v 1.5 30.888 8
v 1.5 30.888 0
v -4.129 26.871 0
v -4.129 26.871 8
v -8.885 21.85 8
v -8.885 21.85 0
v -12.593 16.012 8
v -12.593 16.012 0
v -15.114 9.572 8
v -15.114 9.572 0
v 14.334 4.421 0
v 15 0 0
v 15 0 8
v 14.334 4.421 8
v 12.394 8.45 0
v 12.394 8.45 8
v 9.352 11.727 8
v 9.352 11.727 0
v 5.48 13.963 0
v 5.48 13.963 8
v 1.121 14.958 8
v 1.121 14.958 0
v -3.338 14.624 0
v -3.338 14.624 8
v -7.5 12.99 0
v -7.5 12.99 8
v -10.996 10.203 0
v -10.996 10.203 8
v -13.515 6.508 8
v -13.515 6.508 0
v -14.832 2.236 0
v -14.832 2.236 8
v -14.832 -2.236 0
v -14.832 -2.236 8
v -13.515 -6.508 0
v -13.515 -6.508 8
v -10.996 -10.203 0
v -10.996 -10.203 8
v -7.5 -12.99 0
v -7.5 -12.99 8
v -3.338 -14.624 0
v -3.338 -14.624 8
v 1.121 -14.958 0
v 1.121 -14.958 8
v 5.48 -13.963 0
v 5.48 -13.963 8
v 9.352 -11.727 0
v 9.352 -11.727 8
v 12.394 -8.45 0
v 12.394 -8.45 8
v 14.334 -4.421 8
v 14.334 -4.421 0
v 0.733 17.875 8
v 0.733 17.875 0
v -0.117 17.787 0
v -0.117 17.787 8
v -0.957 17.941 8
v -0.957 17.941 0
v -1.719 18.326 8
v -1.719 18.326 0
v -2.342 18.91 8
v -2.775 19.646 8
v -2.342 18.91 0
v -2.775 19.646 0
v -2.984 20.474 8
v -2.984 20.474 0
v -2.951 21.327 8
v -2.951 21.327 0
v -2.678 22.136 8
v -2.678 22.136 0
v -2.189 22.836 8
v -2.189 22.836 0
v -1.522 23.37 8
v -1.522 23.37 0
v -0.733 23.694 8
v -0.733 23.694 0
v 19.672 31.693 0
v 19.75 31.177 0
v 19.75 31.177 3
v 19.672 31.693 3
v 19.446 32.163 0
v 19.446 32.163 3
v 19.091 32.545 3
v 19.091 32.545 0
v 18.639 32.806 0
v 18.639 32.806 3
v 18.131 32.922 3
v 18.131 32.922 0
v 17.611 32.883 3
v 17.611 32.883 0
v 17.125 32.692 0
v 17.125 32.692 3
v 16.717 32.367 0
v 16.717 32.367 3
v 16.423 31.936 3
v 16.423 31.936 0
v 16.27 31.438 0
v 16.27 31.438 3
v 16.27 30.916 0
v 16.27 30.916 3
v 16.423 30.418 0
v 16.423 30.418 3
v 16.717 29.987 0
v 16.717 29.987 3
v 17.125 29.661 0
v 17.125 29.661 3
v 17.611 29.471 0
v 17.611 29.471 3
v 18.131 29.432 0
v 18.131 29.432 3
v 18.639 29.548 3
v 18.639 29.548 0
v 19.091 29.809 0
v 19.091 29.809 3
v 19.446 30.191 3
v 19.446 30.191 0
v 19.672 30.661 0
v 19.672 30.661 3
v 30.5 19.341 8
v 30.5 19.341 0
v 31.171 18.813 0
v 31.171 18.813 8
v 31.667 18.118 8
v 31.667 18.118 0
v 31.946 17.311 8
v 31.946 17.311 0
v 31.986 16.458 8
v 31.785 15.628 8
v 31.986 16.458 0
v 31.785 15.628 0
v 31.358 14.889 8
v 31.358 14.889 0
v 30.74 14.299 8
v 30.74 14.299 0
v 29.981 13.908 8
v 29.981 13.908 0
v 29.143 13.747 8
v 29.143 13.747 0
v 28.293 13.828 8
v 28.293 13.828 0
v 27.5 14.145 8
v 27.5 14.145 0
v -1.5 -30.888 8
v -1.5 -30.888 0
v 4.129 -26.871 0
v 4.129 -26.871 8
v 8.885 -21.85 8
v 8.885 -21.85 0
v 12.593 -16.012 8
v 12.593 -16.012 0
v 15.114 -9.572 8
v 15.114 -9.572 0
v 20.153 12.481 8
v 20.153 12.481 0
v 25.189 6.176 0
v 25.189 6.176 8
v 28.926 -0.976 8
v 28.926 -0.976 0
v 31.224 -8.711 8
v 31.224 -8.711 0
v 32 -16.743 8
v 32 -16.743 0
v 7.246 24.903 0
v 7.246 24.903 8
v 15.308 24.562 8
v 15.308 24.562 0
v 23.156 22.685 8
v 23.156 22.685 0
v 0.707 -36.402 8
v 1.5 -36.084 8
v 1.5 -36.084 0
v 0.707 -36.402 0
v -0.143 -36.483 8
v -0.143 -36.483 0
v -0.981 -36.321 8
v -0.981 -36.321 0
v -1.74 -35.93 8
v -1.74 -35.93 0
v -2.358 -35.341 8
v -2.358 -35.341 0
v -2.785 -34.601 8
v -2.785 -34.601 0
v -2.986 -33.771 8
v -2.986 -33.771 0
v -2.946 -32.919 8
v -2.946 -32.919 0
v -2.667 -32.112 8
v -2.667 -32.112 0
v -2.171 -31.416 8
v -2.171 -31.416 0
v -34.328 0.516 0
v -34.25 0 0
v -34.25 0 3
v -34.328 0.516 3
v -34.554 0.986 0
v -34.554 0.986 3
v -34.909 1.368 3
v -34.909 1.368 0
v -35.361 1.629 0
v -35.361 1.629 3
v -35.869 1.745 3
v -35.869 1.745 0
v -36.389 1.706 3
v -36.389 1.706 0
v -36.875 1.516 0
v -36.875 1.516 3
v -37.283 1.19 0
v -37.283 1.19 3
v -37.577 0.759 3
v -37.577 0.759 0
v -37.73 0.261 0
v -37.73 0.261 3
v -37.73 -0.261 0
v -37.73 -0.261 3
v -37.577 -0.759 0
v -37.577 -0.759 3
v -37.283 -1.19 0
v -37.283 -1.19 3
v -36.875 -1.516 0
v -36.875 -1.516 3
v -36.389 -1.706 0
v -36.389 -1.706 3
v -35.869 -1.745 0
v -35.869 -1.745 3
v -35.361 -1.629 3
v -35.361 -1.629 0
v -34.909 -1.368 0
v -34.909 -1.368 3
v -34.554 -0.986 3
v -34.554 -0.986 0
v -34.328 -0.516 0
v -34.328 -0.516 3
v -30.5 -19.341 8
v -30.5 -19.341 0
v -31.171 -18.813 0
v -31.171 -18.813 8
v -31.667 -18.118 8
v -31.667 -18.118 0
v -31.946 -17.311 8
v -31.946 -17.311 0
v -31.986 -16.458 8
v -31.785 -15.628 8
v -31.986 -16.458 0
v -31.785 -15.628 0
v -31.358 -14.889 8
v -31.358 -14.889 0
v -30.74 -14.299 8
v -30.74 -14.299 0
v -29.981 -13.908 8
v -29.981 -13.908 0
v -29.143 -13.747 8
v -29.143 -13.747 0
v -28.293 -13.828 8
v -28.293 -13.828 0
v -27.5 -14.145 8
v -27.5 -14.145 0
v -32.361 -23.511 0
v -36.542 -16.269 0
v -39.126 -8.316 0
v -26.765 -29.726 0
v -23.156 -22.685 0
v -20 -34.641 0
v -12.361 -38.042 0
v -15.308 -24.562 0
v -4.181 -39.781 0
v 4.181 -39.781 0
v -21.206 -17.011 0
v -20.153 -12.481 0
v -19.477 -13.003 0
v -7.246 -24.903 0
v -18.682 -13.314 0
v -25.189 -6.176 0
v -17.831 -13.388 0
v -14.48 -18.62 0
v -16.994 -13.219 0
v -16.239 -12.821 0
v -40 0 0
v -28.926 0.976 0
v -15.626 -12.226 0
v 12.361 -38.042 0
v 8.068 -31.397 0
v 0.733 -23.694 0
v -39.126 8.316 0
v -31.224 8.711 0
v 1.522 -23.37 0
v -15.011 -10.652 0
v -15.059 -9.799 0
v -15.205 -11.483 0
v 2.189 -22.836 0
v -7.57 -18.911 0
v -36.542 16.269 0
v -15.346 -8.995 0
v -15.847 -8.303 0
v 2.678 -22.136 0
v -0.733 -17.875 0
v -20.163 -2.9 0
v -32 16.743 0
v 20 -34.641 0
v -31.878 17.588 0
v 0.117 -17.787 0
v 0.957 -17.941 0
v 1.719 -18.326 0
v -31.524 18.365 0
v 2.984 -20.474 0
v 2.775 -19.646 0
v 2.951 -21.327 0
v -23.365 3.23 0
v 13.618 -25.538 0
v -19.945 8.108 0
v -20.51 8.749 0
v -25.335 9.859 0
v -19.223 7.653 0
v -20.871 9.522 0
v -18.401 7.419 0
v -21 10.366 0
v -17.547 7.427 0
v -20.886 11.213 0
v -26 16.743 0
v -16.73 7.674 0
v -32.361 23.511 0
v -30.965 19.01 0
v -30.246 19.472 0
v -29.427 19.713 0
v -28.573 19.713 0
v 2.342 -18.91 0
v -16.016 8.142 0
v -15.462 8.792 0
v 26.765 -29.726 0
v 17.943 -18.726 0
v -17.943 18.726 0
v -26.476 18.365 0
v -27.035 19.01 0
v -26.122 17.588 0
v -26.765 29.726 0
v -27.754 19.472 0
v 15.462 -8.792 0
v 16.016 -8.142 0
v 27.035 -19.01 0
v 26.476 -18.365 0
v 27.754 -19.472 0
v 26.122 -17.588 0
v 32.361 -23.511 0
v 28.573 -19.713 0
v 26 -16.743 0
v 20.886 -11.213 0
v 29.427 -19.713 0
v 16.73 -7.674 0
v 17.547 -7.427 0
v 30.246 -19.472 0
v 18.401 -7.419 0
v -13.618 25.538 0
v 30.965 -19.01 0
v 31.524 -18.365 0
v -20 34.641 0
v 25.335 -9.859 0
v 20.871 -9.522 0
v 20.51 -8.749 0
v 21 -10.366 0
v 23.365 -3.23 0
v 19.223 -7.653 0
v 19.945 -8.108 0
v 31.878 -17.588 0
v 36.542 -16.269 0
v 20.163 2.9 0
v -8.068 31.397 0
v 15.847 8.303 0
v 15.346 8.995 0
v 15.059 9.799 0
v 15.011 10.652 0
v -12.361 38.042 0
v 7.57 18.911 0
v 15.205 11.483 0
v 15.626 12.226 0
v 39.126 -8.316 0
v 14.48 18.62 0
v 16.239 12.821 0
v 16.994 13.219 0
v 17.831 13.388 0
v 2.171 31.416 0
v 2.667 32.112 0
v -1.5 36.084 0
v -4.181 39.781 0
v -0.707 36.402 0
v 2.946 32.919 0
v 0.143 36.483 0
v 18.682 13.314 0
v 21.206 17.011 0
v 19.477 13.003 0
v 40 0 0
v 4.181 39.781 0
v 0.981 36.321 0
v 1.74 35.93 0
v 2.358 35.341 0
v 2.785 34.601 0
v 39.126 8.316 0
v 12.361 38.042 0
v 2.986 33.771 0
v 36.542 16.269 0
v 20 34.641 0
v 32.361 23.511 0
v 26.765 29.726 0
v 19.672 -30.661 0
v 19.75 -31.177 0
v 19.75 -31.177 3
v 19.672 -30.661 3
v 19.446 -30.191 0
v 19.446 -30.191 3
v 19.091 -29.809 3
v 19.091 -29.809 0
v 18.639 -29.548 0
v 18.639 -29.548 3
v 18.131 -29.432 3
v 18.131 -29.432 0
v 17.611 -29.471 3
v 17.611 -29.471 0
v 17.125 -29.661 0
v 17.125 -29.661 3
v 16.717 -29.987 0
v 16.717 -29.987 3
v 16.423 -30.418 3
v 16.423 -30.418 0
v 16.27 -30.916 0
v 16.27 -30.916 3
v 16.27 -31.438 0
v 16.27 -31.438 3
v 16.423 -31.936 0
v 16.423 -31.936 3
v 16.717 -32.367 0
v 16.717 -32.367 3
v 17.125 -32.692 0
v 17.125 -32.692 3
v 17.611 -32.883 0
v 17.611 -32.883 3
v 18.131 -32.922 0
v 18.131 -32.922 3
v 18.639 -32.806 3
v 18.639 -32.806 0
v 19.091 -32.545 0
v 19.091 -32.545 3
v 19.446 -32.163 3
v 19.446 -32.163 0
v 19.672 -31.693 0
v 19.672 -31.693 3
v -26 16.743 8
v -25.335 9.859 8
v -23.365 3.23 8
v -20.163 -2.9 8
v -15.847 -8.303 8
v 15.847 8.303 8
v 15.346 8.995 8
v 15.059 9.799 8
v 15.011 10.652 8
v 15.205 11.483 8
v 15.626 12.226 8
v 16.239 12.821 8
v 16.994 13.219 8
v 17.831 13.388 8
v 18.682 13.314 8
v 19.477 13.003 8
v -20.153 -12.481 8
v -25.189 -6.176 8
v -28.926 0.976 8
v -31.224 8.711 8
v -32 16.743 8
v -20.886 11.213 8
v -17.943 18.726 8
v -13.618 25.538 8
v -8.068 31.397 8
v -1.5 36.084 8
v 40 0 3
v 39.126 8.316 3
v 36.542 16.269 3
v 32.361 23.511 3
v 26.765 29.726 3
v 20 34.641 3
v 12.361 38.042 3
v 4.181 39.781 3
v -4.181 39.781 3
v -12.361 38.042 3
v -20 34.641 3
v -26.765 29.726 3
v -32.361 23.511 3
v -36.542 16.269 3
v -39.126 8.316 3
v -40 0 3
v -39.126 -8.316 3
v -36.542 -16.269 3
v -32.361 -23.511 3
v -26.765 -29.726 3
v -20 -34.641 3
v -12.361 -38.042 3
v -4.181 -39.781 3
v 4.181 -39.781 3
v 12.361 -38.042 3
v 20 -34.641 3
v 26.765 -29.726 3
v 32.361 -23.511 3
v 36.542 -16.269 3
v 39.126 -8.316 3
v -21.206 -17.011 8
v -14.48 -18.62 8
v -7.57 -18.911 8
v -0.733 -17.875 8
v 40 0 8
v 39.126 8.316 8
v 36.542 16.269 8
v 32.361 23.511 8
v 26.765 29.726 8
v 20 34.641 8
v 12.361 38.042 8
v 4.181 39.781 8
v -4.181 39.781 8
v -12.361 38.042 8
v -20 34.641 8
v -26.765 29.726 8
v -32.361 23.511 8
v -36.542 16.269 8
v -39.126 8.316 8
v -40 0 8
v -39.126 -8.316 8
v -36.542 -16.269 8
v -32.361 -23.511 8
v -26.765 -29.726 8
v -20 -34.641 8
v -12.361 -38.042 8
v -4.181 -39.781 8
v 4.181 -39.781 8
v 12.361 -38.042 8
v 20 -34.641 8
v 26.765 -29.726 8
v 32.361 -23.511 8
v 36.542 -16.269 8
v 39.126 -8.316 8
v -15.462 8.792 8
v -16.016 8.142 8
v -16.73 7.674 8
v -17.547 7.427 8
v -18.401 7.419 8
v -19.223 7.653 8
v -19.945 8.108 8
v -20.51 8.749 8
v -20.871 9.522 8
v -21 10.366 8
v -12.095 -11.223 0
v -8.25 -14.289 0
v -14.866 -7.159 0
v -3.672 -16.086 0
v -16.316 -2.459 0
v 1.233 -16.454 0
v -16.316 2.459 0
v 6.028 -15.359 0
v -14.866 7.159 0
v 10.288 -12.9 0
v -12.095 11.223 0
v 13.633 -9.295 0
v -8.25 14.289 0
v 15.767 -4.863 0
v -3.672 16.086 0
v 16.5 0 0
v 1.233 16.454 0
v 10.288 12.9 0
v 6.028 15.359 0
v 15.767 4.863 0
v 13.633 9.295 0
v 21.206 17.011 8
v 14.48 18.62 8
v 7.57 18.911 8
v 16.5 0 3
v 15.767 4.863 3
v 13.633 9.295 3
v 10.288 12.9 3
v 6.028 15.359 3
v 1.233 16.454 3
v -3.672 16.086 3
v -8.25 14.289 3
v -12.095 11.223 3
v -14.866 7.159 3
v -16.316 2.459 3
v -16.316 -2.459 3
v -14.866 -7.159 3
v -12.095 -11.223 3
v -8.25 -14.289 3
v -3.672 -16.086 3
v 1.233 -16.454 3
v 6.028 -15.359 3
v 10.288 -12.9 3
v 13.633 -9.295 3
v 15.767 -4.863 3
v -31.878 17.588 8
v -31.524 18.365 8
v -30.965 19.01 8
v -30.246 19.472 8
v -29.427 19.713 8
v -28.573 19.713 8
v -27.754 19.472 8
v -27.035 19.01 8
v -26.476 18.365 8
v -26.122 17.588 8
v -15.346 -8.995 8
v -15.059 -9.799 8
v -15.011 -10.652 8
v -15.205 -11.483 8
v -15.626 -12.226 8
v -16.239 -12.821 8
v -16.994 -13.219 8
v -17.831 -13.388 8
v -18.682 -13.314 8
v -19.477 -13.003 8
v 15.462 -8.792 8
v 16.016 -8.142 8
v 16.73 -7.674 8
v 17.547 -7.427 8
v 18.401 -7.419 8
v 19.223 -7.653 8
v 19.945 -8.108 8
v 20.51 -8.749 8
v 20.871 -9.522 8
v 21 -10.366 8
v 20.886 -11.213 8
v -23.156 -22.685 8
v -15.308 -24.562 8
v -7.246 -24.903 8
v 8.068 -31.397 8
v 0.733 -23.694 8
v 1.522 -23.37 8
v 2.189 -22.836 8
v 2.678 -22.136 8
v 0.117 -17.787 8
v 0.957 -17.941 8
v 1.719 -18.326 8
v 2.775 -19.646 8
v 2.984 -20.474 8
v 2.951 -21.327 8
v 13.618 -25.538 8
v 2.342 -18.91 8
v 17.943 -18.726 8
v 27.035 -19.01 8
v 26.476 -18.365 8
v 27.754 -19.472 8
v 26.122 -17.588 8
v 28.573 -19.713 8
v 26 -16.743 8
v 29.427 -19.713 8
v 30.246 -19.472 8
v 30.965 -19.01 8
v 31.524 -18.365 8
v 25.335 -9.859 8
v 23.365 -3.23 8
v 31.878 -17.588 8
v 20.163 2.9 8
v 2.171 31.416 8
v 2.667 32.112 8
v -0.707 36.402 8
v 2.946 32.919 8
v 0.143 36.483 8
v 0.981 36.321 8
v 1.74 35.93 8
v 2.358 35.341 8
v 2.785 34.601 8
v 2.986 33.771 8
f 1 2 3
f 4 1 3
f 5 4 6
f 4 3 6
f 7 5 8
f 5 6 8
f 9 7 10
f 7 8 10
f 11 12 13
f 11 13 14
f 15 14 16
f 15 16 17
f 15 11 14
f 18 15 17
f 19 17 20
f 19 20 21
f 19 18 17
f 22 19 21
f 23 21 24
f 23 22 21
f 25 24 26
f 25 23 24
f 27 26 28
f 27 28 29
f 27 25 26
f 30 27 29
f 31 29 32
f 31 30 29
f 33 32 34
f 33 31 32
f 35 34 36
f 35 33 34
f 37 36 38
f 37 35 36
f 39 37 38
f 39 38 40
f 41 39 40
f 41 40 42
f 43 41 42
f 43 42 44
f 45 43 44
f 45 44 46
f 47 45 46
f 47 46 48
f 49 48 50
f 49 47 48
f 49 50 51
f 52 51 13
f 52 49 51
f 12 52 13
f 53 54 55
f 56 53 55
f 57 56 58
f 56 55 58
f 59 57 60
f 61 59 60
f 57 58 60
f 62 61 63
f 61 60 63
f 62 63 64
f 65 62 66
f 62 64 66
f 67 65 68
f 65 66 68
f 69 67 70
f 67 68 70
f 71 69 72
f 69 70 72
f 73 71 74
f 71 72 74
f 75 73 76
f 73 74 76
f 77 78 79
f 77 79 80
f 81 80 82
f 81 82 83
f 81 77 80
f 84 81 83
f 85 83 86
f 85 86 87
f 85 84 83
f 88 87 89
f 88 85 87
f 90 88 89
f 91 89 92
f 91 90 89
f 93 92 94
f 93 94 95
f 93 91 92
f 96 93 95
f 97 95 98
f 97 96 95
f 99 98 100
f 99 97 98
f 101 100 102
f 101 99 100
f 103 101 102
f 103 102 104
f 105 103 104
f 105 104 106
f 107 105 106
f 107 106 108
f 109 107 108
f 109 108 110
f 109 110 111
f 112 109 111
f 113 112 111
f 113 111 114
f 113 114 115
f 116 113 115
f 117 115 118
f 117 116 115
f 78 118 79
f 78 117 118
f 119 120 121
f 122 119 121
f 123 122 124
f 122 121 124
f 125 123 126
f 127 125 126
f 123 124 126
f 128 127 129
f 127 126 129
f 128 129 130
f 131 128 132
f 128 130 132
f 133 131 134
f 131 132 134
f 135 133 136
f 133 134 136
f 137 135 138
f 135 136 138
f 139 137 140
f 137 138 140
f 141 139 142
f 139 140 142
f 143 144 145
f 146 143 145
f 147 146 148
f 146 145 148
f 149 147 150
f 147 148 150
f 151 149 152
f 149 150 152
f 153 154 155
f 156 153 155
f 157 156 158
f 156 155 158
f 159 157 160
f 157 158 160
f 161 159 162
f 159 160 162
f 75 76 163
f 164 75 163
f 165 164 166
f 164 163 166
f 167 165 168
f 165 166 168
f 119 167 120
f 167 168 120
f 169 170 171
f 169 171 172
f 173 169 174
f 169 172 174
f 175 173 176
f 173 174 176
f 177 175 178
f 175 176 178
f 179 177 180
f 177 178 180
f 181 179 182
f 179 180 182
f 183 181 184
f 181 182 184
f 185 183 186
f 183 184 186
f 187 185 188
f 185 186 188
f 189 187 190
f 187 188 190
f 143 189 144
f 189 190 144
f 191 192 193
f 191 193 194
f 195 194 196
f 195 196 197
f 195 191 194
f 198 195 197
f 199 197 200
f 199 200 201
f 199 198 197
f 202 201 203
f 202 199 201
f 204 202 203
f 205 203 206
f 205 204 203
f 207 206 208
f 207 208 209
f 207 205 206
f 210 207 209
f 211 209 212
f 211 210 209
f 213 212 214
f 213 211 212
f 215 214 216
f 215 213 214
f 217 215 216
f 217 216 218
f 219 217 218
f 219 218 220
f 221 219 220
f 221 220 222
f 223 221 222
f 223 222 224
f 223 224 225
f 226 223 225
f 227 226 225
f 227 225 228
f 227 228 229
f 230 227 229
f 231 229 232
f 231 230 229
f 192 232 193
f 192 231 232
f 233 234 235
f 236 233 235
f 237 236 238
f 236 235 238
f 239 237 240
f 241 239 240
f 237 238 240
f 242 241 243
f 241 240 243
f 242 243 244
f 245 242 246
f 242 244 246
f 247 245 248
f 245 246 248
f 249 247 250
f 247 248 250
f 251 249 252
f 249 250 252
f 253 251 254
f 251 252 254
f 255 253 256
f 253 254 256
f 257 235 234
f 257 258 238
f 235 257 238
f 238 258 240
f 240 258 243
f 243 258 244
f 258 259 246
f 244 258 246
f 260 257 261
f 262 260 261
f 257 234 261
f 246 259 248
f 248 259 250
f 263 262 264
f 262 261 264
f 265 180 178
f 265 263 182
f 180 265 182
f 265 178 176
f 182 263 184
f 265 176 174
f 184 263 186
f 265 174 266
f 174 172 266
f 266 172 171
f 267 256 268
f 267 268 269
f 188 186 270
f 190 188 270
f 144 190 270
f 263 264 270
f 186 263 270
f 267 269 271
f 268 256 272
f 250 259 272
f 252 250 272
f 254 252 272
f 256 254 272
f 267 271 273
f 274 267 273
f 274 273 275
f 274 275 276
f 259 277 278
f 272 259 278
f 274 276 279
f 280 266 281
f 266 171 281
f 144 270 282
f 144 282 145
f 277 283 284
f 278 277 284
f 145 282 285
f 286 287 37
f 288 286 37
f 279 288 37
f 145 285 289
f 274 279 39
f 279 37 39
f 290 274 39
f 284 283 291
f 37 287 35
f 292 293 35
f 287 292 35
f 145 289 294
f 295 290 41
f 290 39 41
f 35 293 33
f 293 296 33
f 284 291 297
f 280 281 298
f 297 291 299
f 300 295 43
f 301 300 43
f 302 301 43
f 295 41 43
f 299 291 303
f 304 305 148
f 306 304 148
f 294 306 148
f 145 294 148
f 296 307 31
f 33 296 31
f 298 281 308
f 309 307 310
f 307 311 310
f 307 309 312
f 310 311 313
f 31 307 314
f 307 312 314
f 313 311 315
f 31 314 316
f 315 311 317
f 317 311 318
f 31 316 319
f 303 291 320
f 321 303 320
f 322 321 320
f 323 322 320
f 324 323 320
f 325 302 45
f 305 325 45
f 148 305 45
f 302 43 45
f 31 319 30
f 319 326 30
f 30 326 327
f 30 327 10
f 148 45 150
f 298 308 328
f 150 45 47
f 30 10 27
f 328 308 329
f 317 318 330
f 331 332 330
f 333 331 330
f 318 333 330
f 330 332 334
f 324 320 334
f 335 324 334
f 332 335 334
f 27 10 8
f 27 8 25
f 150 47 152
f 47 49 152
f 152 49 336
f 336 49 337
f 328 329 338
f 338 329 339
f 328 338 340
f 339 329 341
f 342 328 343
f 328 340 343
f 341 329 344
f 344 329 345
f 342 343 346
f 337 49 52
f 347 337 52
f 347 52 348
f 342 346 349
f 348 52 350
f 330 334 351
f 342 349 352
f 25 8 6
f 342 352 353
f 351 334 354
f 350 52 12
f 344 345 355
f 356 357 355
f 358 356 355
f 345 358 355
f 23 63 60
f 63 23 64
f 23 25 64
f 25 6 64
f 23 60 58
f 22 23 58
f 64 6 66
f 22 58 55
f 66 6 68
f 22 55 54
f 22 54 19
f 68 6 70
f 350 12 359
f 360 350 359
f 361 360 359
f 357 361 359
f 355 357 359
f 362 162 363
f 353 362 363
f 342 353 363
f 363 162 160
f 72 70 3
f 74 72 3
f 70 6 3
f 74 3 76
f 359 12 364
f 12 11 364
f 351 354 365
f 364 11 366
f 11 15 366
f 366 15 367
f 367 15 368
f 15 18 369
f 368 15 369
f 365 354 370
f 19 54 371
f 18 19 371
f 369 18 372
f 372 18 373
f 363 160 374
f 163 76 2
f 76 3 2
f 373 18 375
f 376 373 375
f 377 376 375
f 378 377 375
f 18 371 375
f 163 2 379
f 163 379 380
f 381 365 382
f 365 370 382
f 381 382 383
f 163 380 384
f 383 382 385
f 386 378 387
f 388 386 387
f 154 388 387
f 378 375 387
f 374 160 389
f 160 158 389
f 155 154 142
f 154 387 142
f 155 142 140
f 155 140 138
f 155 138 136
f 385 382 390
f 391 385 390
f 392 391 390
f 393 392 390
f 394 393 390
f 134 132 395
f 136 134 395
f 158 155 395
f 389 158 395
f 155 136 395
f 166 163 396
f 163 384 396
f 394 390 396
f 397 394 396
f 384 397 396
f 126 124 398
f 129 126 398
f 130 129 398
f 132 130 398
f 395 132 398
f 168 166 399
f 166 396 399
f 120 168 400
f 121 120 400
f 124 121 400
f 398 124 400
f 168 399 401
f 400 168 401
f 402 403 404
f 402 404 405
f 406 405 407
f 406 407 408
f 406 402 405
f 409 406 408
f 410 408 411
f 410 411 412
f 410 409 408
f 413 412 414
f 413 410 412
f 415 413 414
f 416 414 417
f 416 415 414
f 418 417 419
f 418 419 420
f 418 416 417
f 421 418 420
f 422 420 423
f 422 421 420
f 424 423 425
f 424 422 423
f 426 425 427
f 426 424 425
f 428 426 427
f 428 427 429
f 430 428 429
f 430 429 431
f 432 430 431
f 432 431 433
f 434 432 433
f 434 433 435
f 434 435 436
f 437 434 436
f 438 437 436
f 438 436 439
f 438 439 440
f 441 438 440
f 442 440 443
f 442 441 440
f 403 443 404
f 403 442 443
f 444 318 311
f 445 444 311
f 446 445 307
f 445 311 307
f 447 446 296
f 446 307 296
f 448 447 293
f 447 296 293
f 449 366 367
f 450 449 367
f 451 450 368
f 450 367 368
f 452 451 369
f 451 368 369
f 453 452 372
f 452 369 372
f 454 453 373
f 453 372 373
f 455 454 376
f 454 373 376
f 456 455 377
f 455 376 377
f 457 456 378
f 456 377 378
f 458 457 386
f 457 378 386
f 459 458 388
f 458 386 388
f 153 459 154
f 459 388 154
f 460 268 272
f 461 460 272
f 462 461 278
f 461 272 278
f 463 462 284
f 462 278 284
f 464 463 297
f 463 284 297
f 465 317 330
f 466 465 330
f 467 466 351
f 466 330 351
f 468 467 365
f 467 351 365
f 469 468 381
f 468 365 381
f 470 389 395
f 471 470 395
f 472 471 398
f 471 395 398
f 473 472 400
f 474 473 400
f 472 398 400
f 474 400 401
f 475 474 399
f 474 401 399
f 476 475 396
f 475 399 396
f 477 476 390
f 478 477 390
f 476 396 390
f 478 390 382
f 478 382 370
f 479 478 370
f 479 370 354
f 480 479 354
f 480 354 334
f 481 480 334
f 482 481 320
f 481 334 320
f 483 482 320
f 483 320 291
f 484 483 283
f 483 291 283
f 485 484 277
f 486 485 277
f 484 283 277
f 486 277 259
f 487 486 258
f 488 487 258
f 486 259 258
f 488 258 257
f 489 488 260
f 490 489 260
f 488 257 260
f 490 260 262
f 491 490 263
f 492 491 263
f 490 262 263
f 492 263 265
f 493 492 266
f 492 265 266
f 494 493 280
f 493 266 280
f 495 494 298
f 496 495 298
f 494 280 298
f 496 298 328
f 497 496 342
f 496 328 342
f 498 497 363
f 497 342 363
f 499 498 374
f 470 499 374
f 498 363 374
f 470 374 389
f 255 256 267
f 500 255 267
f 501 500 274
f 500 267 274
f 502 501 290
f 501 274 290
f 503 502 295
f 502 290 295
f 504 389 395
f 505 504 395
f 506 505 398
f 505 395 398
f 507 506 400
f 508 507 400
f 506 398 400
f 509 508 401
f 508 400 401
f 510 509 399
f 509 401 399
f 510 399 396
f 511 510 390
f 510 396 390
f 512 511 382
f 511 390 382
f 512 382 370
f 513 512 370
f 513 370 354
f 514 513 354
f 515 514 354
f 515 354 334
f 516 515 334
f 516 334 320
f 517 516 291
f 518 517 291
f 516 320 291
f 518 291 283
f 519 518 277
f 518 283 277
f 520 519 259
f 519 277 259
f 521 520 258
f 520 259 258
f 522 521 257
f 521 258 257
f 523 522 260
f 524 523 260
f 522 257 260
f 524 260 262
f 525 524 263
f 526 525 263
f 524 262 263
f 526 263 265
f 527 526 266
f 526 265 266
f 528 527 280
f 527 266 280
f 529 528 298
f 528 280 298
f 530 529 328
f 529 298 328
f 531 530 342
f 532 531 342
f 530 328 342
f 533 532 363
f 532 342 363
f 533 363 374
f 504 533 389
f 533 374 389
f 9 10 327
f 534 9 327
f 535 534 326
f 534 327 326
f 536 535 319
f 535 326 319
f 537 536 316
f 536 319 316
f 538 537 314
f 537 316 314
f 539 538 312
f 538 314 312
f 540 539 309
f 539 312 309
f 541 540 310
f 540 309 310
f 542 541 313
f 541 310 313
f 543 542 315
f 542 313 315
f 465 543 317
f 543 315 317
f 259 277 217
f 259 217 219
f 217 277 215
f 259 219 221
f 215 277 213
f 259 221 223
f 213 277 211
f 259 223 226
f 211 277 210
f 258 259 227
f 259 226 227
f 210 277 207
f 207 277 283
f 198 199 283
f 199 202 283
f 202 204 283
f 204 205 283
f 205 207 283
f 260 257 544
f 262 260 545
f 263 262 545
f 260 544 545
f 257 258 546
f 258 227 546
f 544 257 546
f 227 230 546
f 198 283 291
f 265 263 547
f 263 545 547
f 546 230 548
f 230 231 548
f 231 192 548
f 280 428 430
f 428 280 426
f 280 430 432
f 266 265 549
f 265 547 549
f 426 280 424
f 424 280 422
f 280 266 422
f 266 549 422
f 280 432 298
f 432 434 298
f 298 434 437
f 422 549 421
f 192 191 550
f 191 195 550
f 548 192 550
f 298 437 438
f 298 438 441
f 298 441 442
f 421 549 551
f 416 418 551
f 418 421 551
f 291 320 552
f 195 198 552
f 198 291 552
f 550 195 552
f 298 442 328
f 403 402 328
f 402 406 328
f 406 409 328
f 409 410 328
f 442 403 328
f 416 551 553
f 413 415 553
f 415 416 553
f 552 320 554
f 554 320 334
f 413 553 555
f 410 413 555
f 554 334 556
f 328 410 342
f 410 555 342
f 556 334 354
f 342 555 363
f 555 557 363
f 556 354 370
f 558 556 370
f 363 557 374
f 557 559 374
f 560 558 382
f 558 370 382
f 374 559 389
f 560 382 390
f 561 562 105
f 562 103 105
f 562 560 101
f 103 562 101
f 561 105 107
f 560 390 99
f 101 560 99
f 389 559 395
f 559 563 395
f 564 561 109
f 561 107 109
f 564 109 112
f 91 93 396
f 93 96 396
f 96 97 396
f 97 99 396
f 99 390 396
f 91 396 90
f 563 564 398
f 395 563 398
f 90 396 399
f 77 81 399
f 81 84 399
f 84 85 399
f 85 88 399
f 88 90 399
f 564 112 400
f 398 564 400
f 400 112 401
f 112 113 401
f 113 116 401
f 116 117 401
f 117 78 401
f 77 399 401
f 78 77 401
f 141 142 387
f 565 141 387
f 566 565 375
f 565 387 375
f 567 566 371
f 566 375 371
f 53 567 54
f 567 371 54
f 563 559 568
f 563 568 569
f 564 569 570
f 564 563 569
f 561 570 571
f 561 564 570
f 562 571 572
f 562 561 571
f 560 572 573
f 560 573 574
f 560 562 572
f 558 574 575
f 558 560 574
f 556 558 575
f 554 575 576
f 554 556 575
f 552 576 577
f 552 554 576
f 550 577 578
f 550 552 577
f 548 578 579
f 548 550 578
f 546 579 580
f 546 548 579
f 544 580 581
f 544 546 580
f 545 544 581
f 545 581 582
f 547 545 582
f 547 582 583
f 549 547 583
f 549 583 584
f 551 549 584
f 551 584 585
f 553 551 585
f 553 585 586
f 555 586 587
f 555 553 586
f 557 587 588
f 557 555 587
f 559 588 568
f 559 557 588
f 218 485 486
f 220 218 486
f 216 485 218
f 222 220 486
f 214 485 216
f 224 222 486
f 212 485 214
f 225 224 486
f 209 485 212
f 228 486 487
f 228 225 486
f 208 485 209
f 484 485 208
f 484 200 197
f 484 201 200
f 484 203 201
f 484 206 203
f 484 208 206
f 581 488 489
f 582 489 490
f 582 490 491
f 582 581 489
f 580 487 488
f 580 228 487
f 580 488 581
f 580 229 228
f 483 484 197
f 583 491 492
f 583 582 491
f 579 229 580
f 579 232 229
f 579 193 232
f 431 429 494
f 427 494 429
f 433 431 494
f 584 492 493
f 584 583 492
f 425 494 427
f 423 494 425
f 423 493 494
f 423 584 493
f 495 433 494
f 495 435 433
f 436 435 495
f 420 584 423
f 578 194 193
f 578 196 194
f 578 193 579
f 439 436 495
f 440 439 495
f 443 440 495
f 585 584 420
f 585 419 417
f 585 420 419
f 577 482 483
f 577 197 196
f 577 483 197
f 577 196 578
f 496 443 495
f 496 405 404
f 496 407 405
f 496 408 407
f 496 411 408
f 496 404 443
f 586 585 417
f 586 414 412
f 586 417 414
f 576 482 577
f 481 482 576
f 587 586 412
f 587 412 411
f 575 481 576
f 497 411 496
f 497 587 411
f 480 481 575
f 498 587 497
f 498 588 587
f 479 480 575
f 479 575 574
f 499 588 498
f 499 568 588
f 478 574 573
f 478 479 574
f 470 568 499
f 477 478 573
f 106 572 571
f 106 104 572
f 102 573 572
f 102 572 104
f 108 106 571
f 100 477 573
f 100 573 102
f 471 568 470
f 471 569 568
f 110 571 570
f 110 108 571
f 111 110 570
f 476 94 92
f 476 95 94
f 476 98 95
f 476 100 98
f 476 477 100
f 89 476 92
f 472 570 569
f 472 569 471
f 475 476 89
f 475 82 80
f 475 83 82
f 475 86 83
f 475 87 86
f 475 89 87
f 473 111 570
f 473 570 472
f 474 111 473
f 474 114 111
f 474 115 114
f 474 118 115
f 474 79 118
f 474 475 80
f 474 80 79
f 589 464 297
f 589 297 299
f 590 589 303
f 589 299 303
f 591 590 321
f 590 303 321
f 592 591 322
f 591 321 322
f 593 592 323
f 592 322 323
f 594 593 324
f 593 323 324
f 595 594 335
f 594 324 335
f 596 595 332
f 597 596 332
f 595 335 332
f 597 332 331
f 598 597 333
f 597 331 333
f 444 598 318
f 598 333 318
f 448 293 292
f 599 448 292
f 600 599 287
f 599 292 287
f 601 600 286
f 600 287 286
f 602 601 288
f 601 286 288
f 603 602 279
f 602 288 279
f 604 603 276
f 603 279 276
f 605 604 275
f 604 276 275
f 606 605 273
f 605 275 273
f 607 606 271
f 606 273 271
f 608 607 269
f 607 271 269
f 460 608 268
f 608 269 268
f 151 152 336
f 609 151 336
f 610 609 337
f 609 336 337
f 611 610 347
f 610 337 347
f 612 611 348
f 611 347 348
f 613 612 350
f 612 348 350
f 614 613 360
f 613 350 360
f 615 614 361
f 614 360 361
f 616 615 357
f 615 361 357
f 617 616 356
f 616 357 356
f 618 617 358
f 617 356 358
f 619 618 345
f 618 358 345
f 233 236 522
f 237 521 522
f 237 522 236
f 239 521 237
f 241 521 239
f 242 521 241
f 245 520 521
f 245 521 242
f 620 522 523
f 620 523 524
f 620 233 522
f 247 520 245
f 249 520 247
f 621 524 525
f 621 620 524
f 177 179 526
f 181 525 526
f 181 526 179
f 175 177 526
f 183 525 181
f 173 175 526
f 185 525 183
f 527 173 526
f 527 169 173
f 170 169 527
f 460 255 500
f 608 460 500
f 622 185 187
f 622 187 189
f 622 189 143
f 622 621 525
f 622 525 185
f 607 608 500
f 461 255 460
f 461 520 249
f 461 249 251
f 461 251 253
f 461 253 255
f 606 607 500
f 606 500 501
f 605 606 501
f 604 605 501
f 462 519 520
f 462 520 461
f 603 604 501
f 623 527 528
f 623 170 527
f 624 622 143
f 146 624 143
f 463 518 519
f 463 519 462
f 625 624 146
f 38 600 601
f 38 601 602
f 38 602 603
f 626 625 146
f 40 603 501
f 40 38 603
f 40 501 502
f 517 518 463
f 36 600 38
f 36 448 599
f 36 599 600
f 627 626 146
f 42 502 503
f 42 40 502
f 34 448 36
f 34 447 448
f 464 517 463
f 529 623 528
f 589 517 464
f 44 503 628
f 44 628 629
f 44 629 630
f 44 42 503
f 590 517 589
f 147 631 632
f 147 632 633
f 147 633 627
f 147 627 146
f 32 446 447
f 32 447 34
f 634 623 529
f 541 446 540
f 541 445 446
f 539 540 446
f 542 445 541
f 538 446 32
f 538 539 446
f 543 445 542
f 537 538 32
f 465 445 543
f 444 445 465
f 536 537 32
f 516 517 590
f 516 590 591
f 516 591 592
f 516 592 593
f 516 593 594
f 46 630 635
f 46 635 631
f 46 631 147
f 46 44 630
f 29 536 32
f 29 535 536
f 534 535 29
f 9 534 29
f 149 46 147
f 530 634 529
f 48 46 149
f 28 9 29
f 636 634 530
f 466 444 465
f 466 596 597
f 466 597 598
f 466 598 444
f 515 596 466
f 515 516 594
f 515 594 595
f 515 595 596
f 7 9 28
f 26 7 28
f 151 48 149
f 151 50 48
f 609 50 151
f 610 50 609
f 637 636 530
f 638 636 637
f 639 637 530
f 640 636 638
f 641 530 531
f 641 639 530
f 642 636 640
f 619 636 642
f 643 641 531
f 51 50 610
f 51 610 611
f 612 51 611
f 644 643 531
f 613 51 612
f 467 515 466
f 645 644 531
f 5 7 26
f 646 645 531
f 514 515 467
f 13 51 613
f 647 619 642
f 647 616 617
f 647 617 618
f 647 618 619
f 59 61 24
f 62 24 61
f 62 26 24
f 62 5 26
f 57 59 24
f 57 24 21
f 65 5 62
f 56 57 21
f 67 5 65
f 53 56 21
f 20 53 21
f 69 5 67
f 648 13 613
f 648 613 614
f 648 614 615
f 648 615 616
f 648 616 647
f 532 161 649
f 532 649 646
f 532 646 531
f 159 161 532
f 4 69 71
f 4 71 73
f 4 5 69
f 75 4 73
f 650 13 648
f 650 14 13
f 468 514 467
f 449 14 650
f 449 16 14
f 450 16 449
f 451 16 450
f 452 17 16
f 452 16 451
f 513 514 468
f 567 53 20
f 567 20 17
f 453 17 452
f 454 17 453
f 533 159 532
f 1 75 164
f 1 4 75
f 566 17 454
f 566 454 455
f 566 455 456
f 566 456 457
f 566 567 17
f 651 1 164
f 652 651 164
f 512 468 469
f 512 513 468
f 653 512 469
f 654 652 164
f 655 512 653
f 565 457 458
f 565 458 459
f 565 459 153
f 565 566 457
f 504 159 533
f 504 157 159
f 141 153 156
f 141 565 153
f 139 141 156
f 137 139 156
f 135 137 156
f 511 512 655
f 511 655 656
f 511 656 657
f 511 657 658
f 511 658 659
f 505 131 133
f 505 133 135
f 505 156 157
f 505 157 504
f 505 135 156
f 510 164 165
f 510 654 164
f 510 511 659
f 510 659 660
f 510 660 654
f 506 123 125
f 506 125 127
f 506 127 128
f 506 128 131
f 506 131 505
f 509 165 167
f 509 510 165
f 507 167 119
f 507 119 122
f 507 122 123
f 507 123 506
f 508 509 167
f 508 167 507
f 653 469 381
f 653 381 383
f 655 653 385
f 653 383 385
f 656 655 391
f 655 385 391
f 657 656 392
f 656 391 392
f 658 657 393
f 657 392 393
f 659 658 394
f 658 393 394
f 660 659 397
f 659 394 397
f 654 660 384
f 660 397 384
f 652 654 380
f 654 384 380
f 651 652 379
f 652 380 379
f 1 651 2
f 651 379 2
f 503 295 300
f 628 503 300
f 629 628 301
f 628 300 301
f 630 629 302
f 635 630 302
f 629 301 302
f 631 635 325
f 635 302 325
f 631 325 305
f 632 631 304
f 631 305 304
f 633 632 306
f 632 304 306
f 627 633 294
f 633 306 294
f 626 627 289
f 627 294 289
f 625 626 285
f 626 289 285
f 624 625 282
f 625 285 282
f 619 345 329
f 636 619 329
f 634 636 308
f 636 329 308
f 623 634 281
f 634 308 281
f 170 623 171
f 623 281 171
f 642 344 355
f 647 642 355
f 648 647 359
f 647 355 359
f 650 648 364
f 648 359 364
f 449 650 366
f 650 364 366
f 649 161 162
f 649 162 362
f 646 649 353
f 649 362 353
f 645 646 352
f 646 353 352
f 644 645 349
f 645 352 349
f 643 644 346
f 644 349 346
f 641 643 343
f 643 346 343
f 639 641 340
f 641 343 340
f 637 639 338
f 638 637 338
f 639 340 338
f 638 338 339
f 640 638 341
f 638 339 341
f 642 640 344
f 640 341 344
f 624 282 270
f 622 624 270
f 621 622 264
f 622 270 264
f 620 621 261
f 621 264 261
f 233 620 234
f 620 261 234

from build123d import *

# Parameters (mm, degrees)
F0_R     = 40
F0_R_2   = 15
F1_DEPTH = 8
F2_R     = 40
F2_R_2   = 1.75
F2_R_3   = 16.5
F3_DEPTH = 3


with BuildPart() as f1:
    # F0 (on Top) → F1 (new body)
    with BuildSketch(Plane.XY):
        Circle(F0_R)
        with BuildLine():
            ThreePointArc((0.732503888, -23.6938085589), (-15.3080829926, -24.5623956339), (-30.5, -19.3412340179))
            ThreePointArc((-30.5, -19.3412340179), (-31.5980762114, -15.2431578065), (-27.5, -14.1450815951))
            ThreePointArc((-27.5, -14.1450815951), (-14.4799238355, -18.6198244386), (-0.732503888, -17.8754108227))
            ThreePointArc((-0.732503888, -17.8754108227), (2.9091988681, -20.0521058028), (0.732503888, -23.6938085589))
        make_face(mode=Mode.SUBTRACT)
        with BuildLine():
            ThreePointArc((20.8856920684, -11.2125373041), (13.6176171004, -25.5383865717), (1.5, -36.0843918244))
            ThreePointArc((1.5, -36.0843918244), (-2.5980762114, -34.986315613), (-1.5, -30.8882394016))
            ThreePointArc((-1.5, -30.8882394016), (8.8852790601, -21.8498941057), (15.1143079316, -9.5720723868))
            ThreePointArc((15.1143079316, -9.5720723868), (18.8202324586, -7.506612777), (20.8856920684, -11.2125373041))
        make_face(mode=Mode.SUBTRACT)
        with BuildLine():
            ThreePointArc((20.1531881804, 12.4812712549), (28.925700093, -0.9759909379), (32, -16.7431578065))
            ThreePointArc((32, -16.7431578065), (29, -19.7431578065), (26, -16.7431578065))
            ThreePointArc((26, -16.7431578065), (23.3652028956, -3.2300696671), (15.8468118196, 8.303338436))
            ThreePointArc((15.8468118196, 8.303338436), (15.9110335906, 12.5454930258), (20.1531881804, 12.4812712549))
        make_face(mode=Mode.SUBTRACT)
        with BuildLine():
            ThreePointArc((-20.1531881804, -12.4812712549), (-28.925700093, 0.9759909379), (-32, 16.7431578065))
            ThreePointArc((-32, 16.7431578065), (-29, 19.7431578065), (-26, 16.7431578065))
            ThreePointArc((-26, 16.7431578065), (-23.3652028956, 3.2300696671), (-15.8468118196, -8.303338436))
            ThreePointArc((-15.8468118196, -8.303338436), (-15.9110335906, -12.5454930258), (-20.1531881804, -12.4812712549))
        make_face(mode=Mode.SUBTRACT)
        with BuildLine():
            ThreePointArc((-20.8856920684, 11.2125373041), (-13.6176171004, 25.5383865717), (-1.5, 36.0843918244))
            ThreePointArc((-1.5, 36.0843918244), (2.5980762114, 34.986315613), (1.5, 30.8882394016))
            ThreePointArc((1.5, 30.8882394016), (-8.8852790601, 21.8498941057), (-15.1143079316, 9.5720723868))
            ThreePointArc((-15.1143079316, 9.5720723868), (-18.8202324586, 7.506612777), (-20.8856920684, 11.2125373041))
        make_face(mode=Mode.SUBTRACT)
        Circle(F0_R_2, mode=Mode.SUBTRACT)
        with BuildLine():
            ThreePointArc((-0.732503888, 23.6938085589), (15.3080829926, 24.5623956339), (30.5, 19.3412340179))
            ThreePointArc((30.5, 19.3412340179), (31.5980762114, 15.2431578065), (27.5, 14.1450815951))
            ThreePointArc((27.5, 14.1450815951), (14.4799238355, 18.6198244386), (0.732503888, 17.8754108227))
            ThreePointArc((0.732503888, 17.8754108227), (-2.9091988681, 20.0521058028), (-0.732503888, 23.6938085589))
        make_face(mode=Mode.SUBTRACT)
    extrude(amount=F1_DEPTH)


with BuildPart() as f3:
    # F2 (on Top) → F3 (new body)
    with BuildSketch(Plane.XY):
        Circle(F2_R)
        with Locations((18, -31.1769145362)):
            Circle(F2_R_2, mode=Mode.SUBTRACT)
        with Locations((-36, 0)):
            Circle(F2_R_2, mode=Mode.SUBTRACT)
        Circle(F2_R_3, mode=Mode.SUBTRACT)
        with Locations((18, 31.1769145362)):
            Circle(F2_R_2, mode=Mode.SUBTRACT)
    extrude(amount=F3_DEPTH)


solid = Compound([f1.part, f3.part])
